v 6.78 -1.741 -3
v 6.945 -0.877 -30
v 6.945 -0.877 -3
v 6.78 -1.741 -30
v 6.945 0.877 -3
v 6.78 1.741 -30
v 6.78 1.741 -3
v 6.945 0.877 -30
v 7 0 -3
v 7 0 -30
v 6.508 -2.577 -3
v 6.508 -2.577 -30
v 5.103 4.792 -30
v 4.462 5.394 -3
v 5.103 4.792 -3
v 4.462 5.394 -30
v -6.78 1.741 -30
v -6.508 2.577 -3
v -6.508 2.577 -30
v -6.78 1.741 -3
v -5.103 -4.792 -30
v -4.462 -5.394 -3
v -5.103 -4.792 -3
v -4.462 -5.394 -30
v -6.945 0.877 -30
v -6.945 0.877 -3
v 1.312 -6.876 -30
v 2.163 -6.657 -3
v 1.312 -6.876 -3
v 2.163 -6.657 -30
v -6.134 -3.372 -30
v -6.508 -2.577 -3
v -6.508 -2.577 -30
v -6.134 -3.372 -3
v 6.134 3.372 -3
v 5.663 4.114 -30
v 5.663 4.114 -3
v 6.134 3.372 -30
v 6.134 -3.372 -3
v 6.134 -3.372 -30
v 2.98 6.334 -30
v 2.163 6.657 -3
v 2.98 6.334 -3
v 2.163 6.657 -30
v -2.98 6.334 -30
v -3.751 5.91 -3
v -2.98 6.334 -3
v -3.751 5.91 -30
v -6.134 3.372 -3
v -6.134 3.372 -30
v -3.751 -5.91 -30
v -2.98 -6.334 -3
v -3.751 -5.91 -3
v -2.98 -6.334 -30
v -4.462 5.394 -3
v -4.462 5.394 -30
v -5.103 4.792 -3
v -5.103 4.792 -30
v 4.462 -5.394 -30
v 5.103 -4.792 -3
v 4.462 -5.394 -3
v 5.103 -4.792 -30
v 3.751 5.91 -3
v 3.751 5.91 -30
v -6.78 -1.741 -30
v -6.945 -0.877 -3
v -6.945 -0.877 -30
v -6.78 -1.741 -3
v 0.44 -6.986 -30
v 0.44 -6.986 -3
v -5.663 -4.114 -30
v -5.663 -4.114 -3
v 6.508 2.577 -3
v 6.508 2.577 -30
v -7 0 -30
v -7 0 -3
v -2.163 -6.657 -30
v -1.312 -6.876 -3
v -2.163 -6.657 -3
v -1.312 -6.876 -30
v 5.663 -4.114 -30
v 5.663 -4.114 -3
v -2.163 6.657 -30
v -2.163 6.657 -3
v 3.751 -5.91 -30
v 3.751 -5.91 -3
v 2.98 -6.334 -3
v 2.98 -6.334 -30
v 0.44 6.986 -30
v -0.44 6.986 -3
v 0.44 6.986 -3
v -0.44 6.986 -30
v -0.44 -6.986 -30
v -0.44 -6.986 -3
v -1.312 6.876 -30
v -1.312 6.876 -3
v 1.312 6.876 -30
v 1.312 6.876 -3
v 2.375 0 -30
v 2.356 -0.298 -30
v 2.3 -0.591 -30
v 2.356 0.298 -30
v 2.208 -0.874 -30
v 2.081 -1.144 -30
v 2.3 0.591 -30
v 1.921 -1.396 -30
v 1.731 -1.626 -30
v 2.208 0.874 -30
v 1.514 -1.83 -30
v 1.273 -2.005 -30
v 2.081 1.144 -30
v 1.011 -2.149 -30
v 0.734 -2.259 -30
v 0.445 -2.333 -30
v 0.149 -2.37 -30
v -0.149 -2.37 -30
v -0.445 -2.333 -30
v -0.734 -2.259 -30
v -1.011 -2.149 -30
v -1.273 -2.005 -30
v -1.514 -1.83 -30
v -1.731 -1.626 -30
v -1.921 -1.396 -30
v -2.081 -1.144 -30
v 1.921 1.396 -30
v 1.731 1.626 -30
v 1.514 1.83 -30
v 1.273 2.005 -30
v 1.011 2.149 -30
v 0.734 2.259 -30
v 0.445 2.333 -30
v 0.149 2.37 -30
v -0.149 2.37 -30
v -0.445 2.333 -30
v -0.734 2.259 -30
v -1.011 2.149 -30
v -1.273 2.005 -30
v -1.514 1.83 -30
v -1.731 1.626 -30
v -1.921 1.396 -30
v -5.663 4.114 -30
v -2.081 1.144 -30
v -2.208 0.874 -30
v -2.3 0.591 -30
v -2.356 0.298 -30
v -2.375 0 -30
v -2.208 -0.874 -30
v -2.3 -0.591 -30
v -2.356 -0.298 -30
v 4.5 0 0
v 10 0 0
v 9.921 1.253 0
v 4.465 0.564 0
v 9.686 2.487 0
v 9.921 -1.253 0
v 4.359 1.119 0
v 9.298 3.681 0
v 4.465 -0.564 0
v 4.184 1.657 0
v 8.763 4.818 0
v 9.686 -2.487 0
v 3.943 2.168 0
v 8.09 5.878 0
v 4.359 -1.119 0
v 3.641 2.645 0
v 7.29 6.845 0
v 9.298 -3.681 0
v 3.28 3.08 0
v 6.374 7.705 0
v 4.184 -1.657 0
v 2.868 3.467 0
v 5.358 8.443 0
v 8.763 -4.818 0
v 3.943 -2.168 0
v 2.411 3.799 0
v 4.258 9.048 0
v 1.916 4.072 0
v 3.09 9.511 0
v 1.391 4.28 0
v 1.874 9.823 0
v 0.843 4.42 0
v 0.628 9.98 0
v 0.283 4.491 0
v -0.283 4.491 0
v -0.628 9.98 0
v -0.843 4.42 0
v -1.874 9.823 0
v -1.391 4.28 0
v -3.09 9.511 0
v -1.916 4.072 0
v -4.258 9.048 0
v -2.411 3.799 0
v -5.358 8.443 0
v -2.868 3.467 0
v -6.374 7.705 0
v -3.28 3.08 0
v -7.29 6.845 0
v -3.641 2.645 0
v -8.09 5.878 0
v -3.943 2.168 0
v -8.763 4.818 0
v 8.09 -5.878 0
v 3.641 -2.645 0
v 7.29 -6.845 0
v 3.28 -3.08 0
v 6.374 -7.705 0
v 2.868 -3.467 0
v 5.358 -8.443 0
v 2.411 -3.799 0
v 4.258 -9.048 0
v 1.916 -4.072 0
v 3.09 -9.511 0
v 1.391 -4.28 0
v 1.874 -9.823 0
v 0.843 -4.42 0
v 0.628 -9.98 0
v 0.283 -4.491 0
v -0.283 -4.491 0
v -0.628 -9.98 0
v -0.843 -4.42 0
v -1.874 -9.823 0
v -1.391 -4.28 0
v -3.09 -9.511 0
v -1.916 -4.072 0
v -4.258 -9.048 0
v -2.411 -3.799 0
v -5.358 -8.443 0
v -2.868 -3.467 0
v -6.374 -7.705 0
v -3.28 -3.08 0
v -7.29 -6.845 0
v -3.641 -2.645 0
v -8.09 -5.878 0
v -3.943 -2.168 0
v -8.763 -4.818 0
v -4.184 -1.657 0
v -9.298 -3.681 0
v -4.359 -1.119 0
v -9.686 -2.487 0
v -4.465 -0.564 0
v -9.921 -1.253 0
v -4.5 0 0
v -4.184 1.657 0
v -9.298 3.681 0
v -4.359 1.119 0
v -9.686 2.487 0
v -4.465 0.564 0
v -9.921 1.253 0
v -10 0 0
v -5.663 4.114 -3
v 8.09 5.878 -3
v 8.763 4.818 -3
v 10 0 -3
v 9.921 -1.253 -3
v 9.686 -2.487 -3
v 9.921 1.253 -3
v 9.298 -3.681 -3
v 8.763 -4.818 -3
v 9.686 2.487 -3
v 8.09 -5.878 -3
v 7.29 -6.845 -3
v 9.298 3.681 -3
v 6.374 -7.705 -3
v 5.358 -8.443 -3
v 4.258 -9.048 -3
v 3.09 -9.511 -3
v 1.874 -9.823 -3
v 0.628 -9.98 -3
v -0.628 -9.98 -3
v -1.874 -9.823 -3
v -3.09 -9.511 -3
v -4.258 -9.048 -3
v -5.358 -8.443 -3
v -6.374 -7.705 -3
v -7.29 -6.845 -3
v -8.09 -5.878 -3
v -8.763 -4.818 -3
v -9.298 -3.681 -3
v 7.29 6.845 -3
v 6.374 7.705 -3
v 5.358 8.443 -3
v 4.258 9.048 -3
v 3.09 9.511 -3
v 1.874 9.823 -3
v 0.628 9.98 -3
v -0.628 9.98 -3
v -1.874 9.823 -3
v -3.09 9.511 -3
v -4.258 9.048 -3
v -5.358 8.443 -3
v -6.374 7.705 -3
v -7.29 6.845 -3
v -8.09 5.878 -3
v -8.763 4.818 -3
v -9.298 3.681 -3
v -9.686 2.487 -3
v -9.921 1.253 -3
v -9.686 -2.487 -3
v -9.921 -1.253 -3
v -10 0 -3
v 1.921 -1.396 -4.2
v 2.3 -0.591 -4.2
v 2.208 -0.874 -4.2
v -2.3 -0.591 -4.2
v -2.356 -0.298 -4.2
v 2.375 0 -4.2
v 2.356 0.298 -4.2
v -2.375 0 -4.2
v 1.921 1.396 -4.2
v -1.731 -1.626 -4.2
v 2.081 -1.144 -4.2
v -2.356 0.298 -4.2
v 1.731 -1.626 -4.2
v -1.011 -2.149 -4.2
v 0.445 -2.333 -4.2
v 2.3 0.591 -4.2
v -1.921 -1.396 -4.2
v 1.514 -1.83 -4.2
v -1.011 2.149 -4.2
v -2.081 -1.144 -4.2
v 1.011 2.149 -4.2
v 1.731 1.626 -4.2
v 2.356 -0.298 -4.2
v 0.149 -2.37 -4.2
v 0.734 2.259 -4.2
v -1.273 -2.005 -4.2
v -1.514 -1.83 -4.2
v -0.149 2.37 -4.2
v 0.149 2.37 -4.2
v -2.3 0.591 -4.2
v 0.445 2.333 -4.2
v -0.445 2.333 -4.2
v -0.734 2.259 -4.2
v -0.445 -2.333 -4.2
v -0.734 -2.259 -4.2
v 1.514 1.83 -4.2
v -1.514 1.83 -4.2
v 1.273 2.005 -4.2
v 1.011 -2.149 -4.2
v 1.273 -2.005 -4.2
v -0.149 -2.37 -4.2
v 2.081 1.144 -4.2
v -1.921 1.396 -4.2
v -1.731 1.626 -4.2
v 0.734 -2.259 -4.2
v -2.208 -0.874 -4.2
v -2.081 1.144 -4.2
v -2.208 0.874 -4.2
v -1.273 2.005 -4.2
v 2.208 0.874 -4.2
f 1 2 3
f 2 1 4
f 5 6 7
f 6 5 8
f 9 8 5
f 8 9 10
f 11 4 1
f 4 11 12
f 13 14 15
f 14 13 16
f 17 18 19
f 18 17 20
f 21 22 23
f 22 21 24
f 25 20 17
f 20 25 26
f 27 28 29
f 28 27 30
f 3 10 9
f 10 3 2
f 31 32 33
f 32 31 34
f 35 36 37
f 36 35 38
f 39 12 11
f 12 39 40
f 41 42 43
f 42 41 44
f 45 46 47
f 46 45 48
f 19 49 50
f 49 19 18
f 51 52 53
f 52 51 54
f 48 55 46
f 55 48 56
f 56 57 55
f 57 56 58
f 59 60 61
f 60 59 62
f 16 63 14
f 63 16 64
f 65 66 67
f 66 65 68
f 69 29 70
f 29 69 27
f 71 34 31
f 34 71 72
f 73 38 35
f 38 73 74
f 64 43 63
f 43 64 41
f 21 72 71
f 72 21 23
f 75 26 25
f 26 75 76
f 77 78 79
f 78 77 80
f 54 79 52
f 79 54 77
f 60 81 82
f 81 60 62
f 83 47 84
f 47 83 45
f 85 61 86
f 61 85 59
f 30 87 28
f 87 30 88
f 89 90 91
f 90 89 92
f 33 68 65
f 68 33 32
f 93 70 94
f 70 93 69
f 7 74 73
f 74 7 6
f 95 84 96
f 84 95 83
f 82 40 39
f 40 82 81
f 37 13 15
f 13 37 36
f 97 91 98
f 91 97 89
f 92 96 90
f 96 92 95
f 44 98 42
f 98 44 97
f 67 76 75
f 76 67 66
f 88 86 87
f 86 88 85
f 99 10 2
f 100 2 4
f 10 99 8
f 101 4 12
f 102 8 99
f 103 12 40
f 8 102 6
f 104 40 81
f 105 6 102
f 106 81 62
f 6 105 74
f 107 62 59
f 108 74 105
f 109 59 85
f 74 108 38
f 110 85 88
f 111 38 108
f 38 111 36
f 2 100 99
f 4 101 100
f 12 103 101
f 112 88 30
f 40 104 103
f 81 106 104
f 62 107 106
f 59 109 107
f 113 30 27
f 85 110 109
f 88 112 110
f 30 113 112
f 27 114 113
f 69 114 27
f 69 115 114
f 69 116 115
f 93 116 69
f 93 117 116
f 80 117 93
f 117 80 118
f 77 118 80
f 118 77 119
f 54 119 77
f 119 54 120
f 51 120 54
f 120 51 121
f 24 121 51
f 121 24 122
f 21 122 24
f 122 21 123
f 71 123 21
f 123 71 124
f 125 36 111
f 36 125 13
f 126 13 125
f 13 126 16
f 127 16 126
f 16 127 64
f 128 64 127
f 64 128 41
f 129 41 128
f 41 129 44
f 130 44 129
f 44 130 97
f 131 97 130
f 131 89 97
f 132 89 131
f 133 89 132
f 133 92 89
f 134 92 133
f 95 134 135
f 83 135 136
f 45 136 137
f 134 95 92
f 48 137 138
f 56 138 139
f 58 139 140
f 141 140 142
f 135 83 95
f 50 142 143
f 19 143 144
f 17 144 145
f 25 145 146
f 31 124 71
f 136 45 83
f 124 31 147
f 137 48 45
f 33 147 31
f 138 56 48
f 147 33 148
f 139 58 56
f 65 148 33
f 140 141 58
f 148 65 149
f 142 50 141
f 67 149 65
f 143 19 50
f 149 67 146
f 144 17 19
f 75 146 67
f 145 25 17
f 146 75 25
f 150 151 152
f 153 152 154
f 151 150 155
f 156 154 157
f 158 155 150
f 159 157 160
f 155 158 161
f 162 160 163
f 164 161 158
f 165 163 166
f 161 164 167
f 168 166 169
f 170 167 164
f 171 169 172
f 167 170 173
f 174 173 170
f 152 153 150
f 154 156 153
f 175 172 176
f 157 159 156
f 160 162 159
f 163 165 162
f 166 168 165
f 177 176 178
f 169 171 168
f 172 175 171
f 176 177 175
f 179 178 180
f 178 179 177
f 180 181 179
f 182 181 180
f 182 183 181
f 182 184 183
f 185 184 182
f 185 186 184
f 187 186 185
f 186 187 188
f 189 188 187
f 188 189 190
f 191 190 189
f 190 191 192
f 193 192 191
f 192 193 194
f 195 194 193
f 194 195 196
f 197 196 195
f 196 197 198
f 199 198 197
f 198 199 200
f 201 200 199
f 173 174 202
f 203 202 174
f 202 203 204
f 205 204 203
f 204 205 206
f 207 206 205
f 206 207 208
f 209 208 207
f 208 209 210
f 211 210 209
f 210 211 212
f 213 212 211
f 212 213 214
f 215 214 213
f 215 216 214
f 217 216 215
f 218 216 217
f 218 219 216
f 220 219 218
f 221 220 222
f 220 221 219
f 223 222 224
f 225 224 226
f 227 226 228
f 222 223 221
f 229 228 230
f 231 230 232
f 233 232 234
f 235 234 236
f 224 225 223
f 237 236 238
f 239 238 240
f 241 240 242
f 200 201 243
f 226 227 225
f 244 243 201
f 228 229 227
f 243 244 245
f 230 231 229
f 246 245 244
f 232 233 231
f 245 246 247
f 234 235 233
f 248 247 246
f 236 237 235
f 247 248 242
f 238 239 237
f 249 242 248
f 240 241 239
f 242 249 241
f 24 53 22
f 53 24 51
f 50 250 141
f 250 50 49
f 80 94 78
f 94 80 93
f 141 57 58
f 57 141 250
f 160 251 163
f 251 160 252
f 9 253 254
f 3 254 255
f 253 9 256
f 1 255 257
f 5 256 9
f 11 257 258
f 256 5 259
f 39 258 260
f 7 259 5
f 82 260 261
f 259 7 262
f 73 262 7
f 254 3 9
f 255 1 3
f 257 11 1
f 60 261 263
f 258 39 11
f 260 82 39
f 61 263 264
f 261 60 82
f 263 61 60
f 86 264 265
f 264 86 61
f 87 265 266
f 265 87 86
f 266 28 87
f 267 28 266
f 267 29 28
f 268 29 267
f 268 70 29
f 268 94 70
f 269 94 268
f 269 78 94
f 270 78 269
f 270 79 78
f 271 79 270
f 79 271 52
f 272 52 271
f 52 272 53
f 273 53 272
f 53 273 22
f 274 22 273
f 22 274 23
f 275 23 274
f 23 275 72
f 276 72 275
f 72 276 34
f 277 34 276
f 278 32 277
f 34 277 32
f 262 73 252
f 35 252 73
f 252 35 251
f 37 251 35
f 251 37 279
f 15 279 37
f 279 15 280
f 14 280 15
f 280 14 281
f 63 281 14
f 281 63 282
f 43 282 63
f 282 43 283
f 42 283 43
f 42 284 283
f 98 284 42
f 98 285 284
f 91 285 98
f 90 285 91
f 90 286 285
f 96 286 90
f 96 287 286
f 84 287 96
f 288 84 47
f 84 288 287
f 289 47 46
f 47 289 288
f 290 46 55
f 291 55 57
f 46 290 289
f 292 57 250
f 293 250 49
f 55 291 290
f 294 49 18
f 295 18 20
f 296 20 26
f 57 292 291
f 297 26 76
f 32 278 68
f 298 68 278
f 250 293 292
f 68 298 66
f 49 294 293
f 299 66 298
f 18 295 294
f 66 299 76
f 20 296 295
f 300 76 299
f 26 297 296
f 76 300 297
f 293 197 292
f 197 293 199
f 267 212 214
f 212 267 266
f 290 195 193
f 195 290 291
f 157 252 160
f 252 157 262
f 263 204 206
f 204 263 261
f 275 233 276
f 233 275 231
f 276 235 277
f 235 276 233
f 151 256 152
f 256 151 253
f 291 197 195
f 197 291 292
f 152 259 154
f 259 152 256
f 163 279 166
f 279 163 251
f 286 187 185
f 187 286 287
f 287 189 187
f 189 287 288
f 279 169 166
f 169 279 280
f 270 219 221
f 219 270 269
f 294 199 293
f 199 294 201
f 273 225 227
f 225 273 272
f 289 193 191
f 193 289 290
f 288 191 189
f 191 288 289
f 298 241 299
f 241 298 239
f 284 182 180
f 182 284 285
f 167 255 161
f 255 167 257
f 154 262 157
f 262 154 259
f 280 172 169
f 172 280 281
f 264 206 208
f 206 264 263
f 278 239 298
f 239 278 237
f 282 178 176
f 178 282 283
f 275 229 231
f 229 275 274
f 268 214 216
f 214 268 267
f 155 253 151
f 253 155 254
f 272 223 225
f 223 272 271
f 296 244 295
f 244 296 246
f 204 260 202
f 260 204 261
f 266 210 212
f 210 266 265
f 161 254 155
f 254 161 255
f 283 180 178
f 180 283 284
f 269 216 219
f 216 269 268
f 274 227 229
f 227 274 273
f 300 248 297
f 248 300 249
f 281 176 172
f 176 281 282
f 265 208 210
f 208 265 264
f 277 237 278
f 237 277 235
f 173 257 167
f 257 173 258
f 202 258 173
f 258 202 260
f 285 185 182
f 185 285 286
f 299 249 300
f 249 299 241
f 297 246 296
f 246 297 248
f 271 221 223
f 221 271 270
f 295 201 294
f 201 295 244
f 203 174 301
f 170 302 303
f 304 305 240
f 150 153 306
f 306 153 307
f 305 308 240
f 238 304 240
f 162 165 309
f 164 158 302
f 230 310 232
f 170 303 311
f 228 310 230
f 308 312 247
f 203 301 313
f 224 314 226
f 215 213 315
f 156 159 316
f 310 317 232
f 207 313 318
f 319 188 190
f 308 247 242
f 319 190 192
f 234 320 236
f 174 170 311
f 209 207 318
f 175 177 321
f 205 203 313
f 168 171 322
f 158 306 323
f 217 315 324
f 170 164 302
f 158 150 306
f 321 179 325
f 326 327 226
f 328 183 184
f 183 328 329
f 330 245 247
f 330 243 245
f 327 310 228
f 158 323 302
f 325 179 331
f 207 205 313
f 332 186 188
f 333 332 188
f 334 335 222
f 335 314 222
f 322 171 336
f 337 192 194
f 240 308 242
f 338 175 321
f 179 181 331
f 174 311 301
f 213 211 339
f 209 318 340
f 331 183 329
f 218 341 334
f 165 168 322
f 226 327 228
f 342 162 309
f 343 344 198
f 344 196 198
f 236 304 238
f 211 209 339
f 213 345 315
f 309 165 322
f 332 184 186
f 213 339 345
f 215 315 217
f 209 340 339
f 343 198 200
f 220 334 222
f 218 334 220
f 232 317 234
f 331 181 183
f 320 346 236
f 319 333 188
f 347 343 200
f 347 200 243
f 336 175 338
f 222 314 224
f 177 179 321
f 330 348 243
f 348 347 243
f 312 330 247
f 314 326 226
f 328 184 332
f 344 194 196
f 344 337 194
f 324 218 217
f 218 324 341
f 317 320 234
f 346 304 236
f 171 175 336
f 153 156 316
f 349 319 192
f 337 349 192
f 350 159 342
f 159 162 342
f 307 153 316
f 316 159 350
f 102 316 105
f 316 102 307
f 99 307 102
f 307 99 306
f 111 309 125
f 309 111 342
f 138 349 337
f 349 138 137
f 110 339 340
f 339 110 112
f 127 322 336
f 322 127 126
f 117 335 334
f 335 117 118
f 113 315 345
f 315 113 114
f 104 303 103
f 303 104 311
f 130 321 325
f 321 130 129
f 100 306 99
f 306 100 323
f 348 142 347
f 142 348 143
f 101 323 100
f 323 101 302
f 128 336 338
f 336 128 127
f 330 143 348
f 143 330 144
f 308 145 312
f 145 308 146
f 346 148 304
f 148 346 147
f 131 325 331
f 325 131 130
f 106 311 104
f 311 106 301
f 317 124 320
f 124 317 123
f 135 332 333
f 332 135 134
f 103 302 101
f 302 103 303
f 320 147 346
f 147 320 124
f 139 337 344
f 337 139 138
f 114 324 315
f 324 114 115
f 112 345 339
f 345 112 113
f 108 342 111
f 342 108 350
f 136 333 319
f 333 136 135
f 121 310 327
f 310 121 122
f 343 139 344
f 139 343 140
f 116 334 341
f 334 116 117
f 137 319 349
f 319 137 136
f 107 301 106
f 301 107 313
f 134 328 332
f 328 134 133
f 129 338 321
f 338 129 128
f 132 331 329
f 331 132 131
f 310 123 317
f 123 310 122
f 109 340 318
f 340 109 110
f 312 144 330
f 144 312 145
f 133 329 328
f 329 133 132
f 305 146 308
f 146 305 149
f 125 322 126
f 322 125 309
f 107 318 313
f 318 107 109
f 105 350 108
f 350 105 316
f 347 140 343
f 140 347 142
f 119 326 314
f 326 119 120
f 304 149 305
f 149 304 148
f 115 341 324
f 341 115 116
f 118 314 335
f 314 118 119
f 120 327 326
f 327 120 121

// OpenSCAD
$fn = 50;


difference() {
	union() {
		translate(v = [0, 0, -30.0000000000]) {
			cylinder(h = 30, r = 7.0000000000);
		}
		translate(v = [0, 0, -3.0000000000]) {
			cylinder(h = 3, r = 10.0000000000);
		}
	}
	union() {
		translate(v = [0, 0, 0]) {
			rotate(a = [0, 0, 0]) {
				difference() {
					union() {
						#translate(v = [0, 0, -30.0000000000]) {
							cylinder(h = 30, r = 2.2500000000);
						}
						#translate(v = [0, 0, -4.2000000000]) {
							cylinder(h = 4.2000000000, r1 = 2.3750000000, r2 = 4.5000000000);
						}
						#translate(v = [0, 0, -30.0000000000]) {
							cylinder(h = 30, r = 2.3750000000);
						}
						#translate(v = [0, 0, -30.0000000000]) {
							cylinder(h = 30, r = 2.2500000000);
						}
					}
					union();
				}
			}
		}
	}
}
